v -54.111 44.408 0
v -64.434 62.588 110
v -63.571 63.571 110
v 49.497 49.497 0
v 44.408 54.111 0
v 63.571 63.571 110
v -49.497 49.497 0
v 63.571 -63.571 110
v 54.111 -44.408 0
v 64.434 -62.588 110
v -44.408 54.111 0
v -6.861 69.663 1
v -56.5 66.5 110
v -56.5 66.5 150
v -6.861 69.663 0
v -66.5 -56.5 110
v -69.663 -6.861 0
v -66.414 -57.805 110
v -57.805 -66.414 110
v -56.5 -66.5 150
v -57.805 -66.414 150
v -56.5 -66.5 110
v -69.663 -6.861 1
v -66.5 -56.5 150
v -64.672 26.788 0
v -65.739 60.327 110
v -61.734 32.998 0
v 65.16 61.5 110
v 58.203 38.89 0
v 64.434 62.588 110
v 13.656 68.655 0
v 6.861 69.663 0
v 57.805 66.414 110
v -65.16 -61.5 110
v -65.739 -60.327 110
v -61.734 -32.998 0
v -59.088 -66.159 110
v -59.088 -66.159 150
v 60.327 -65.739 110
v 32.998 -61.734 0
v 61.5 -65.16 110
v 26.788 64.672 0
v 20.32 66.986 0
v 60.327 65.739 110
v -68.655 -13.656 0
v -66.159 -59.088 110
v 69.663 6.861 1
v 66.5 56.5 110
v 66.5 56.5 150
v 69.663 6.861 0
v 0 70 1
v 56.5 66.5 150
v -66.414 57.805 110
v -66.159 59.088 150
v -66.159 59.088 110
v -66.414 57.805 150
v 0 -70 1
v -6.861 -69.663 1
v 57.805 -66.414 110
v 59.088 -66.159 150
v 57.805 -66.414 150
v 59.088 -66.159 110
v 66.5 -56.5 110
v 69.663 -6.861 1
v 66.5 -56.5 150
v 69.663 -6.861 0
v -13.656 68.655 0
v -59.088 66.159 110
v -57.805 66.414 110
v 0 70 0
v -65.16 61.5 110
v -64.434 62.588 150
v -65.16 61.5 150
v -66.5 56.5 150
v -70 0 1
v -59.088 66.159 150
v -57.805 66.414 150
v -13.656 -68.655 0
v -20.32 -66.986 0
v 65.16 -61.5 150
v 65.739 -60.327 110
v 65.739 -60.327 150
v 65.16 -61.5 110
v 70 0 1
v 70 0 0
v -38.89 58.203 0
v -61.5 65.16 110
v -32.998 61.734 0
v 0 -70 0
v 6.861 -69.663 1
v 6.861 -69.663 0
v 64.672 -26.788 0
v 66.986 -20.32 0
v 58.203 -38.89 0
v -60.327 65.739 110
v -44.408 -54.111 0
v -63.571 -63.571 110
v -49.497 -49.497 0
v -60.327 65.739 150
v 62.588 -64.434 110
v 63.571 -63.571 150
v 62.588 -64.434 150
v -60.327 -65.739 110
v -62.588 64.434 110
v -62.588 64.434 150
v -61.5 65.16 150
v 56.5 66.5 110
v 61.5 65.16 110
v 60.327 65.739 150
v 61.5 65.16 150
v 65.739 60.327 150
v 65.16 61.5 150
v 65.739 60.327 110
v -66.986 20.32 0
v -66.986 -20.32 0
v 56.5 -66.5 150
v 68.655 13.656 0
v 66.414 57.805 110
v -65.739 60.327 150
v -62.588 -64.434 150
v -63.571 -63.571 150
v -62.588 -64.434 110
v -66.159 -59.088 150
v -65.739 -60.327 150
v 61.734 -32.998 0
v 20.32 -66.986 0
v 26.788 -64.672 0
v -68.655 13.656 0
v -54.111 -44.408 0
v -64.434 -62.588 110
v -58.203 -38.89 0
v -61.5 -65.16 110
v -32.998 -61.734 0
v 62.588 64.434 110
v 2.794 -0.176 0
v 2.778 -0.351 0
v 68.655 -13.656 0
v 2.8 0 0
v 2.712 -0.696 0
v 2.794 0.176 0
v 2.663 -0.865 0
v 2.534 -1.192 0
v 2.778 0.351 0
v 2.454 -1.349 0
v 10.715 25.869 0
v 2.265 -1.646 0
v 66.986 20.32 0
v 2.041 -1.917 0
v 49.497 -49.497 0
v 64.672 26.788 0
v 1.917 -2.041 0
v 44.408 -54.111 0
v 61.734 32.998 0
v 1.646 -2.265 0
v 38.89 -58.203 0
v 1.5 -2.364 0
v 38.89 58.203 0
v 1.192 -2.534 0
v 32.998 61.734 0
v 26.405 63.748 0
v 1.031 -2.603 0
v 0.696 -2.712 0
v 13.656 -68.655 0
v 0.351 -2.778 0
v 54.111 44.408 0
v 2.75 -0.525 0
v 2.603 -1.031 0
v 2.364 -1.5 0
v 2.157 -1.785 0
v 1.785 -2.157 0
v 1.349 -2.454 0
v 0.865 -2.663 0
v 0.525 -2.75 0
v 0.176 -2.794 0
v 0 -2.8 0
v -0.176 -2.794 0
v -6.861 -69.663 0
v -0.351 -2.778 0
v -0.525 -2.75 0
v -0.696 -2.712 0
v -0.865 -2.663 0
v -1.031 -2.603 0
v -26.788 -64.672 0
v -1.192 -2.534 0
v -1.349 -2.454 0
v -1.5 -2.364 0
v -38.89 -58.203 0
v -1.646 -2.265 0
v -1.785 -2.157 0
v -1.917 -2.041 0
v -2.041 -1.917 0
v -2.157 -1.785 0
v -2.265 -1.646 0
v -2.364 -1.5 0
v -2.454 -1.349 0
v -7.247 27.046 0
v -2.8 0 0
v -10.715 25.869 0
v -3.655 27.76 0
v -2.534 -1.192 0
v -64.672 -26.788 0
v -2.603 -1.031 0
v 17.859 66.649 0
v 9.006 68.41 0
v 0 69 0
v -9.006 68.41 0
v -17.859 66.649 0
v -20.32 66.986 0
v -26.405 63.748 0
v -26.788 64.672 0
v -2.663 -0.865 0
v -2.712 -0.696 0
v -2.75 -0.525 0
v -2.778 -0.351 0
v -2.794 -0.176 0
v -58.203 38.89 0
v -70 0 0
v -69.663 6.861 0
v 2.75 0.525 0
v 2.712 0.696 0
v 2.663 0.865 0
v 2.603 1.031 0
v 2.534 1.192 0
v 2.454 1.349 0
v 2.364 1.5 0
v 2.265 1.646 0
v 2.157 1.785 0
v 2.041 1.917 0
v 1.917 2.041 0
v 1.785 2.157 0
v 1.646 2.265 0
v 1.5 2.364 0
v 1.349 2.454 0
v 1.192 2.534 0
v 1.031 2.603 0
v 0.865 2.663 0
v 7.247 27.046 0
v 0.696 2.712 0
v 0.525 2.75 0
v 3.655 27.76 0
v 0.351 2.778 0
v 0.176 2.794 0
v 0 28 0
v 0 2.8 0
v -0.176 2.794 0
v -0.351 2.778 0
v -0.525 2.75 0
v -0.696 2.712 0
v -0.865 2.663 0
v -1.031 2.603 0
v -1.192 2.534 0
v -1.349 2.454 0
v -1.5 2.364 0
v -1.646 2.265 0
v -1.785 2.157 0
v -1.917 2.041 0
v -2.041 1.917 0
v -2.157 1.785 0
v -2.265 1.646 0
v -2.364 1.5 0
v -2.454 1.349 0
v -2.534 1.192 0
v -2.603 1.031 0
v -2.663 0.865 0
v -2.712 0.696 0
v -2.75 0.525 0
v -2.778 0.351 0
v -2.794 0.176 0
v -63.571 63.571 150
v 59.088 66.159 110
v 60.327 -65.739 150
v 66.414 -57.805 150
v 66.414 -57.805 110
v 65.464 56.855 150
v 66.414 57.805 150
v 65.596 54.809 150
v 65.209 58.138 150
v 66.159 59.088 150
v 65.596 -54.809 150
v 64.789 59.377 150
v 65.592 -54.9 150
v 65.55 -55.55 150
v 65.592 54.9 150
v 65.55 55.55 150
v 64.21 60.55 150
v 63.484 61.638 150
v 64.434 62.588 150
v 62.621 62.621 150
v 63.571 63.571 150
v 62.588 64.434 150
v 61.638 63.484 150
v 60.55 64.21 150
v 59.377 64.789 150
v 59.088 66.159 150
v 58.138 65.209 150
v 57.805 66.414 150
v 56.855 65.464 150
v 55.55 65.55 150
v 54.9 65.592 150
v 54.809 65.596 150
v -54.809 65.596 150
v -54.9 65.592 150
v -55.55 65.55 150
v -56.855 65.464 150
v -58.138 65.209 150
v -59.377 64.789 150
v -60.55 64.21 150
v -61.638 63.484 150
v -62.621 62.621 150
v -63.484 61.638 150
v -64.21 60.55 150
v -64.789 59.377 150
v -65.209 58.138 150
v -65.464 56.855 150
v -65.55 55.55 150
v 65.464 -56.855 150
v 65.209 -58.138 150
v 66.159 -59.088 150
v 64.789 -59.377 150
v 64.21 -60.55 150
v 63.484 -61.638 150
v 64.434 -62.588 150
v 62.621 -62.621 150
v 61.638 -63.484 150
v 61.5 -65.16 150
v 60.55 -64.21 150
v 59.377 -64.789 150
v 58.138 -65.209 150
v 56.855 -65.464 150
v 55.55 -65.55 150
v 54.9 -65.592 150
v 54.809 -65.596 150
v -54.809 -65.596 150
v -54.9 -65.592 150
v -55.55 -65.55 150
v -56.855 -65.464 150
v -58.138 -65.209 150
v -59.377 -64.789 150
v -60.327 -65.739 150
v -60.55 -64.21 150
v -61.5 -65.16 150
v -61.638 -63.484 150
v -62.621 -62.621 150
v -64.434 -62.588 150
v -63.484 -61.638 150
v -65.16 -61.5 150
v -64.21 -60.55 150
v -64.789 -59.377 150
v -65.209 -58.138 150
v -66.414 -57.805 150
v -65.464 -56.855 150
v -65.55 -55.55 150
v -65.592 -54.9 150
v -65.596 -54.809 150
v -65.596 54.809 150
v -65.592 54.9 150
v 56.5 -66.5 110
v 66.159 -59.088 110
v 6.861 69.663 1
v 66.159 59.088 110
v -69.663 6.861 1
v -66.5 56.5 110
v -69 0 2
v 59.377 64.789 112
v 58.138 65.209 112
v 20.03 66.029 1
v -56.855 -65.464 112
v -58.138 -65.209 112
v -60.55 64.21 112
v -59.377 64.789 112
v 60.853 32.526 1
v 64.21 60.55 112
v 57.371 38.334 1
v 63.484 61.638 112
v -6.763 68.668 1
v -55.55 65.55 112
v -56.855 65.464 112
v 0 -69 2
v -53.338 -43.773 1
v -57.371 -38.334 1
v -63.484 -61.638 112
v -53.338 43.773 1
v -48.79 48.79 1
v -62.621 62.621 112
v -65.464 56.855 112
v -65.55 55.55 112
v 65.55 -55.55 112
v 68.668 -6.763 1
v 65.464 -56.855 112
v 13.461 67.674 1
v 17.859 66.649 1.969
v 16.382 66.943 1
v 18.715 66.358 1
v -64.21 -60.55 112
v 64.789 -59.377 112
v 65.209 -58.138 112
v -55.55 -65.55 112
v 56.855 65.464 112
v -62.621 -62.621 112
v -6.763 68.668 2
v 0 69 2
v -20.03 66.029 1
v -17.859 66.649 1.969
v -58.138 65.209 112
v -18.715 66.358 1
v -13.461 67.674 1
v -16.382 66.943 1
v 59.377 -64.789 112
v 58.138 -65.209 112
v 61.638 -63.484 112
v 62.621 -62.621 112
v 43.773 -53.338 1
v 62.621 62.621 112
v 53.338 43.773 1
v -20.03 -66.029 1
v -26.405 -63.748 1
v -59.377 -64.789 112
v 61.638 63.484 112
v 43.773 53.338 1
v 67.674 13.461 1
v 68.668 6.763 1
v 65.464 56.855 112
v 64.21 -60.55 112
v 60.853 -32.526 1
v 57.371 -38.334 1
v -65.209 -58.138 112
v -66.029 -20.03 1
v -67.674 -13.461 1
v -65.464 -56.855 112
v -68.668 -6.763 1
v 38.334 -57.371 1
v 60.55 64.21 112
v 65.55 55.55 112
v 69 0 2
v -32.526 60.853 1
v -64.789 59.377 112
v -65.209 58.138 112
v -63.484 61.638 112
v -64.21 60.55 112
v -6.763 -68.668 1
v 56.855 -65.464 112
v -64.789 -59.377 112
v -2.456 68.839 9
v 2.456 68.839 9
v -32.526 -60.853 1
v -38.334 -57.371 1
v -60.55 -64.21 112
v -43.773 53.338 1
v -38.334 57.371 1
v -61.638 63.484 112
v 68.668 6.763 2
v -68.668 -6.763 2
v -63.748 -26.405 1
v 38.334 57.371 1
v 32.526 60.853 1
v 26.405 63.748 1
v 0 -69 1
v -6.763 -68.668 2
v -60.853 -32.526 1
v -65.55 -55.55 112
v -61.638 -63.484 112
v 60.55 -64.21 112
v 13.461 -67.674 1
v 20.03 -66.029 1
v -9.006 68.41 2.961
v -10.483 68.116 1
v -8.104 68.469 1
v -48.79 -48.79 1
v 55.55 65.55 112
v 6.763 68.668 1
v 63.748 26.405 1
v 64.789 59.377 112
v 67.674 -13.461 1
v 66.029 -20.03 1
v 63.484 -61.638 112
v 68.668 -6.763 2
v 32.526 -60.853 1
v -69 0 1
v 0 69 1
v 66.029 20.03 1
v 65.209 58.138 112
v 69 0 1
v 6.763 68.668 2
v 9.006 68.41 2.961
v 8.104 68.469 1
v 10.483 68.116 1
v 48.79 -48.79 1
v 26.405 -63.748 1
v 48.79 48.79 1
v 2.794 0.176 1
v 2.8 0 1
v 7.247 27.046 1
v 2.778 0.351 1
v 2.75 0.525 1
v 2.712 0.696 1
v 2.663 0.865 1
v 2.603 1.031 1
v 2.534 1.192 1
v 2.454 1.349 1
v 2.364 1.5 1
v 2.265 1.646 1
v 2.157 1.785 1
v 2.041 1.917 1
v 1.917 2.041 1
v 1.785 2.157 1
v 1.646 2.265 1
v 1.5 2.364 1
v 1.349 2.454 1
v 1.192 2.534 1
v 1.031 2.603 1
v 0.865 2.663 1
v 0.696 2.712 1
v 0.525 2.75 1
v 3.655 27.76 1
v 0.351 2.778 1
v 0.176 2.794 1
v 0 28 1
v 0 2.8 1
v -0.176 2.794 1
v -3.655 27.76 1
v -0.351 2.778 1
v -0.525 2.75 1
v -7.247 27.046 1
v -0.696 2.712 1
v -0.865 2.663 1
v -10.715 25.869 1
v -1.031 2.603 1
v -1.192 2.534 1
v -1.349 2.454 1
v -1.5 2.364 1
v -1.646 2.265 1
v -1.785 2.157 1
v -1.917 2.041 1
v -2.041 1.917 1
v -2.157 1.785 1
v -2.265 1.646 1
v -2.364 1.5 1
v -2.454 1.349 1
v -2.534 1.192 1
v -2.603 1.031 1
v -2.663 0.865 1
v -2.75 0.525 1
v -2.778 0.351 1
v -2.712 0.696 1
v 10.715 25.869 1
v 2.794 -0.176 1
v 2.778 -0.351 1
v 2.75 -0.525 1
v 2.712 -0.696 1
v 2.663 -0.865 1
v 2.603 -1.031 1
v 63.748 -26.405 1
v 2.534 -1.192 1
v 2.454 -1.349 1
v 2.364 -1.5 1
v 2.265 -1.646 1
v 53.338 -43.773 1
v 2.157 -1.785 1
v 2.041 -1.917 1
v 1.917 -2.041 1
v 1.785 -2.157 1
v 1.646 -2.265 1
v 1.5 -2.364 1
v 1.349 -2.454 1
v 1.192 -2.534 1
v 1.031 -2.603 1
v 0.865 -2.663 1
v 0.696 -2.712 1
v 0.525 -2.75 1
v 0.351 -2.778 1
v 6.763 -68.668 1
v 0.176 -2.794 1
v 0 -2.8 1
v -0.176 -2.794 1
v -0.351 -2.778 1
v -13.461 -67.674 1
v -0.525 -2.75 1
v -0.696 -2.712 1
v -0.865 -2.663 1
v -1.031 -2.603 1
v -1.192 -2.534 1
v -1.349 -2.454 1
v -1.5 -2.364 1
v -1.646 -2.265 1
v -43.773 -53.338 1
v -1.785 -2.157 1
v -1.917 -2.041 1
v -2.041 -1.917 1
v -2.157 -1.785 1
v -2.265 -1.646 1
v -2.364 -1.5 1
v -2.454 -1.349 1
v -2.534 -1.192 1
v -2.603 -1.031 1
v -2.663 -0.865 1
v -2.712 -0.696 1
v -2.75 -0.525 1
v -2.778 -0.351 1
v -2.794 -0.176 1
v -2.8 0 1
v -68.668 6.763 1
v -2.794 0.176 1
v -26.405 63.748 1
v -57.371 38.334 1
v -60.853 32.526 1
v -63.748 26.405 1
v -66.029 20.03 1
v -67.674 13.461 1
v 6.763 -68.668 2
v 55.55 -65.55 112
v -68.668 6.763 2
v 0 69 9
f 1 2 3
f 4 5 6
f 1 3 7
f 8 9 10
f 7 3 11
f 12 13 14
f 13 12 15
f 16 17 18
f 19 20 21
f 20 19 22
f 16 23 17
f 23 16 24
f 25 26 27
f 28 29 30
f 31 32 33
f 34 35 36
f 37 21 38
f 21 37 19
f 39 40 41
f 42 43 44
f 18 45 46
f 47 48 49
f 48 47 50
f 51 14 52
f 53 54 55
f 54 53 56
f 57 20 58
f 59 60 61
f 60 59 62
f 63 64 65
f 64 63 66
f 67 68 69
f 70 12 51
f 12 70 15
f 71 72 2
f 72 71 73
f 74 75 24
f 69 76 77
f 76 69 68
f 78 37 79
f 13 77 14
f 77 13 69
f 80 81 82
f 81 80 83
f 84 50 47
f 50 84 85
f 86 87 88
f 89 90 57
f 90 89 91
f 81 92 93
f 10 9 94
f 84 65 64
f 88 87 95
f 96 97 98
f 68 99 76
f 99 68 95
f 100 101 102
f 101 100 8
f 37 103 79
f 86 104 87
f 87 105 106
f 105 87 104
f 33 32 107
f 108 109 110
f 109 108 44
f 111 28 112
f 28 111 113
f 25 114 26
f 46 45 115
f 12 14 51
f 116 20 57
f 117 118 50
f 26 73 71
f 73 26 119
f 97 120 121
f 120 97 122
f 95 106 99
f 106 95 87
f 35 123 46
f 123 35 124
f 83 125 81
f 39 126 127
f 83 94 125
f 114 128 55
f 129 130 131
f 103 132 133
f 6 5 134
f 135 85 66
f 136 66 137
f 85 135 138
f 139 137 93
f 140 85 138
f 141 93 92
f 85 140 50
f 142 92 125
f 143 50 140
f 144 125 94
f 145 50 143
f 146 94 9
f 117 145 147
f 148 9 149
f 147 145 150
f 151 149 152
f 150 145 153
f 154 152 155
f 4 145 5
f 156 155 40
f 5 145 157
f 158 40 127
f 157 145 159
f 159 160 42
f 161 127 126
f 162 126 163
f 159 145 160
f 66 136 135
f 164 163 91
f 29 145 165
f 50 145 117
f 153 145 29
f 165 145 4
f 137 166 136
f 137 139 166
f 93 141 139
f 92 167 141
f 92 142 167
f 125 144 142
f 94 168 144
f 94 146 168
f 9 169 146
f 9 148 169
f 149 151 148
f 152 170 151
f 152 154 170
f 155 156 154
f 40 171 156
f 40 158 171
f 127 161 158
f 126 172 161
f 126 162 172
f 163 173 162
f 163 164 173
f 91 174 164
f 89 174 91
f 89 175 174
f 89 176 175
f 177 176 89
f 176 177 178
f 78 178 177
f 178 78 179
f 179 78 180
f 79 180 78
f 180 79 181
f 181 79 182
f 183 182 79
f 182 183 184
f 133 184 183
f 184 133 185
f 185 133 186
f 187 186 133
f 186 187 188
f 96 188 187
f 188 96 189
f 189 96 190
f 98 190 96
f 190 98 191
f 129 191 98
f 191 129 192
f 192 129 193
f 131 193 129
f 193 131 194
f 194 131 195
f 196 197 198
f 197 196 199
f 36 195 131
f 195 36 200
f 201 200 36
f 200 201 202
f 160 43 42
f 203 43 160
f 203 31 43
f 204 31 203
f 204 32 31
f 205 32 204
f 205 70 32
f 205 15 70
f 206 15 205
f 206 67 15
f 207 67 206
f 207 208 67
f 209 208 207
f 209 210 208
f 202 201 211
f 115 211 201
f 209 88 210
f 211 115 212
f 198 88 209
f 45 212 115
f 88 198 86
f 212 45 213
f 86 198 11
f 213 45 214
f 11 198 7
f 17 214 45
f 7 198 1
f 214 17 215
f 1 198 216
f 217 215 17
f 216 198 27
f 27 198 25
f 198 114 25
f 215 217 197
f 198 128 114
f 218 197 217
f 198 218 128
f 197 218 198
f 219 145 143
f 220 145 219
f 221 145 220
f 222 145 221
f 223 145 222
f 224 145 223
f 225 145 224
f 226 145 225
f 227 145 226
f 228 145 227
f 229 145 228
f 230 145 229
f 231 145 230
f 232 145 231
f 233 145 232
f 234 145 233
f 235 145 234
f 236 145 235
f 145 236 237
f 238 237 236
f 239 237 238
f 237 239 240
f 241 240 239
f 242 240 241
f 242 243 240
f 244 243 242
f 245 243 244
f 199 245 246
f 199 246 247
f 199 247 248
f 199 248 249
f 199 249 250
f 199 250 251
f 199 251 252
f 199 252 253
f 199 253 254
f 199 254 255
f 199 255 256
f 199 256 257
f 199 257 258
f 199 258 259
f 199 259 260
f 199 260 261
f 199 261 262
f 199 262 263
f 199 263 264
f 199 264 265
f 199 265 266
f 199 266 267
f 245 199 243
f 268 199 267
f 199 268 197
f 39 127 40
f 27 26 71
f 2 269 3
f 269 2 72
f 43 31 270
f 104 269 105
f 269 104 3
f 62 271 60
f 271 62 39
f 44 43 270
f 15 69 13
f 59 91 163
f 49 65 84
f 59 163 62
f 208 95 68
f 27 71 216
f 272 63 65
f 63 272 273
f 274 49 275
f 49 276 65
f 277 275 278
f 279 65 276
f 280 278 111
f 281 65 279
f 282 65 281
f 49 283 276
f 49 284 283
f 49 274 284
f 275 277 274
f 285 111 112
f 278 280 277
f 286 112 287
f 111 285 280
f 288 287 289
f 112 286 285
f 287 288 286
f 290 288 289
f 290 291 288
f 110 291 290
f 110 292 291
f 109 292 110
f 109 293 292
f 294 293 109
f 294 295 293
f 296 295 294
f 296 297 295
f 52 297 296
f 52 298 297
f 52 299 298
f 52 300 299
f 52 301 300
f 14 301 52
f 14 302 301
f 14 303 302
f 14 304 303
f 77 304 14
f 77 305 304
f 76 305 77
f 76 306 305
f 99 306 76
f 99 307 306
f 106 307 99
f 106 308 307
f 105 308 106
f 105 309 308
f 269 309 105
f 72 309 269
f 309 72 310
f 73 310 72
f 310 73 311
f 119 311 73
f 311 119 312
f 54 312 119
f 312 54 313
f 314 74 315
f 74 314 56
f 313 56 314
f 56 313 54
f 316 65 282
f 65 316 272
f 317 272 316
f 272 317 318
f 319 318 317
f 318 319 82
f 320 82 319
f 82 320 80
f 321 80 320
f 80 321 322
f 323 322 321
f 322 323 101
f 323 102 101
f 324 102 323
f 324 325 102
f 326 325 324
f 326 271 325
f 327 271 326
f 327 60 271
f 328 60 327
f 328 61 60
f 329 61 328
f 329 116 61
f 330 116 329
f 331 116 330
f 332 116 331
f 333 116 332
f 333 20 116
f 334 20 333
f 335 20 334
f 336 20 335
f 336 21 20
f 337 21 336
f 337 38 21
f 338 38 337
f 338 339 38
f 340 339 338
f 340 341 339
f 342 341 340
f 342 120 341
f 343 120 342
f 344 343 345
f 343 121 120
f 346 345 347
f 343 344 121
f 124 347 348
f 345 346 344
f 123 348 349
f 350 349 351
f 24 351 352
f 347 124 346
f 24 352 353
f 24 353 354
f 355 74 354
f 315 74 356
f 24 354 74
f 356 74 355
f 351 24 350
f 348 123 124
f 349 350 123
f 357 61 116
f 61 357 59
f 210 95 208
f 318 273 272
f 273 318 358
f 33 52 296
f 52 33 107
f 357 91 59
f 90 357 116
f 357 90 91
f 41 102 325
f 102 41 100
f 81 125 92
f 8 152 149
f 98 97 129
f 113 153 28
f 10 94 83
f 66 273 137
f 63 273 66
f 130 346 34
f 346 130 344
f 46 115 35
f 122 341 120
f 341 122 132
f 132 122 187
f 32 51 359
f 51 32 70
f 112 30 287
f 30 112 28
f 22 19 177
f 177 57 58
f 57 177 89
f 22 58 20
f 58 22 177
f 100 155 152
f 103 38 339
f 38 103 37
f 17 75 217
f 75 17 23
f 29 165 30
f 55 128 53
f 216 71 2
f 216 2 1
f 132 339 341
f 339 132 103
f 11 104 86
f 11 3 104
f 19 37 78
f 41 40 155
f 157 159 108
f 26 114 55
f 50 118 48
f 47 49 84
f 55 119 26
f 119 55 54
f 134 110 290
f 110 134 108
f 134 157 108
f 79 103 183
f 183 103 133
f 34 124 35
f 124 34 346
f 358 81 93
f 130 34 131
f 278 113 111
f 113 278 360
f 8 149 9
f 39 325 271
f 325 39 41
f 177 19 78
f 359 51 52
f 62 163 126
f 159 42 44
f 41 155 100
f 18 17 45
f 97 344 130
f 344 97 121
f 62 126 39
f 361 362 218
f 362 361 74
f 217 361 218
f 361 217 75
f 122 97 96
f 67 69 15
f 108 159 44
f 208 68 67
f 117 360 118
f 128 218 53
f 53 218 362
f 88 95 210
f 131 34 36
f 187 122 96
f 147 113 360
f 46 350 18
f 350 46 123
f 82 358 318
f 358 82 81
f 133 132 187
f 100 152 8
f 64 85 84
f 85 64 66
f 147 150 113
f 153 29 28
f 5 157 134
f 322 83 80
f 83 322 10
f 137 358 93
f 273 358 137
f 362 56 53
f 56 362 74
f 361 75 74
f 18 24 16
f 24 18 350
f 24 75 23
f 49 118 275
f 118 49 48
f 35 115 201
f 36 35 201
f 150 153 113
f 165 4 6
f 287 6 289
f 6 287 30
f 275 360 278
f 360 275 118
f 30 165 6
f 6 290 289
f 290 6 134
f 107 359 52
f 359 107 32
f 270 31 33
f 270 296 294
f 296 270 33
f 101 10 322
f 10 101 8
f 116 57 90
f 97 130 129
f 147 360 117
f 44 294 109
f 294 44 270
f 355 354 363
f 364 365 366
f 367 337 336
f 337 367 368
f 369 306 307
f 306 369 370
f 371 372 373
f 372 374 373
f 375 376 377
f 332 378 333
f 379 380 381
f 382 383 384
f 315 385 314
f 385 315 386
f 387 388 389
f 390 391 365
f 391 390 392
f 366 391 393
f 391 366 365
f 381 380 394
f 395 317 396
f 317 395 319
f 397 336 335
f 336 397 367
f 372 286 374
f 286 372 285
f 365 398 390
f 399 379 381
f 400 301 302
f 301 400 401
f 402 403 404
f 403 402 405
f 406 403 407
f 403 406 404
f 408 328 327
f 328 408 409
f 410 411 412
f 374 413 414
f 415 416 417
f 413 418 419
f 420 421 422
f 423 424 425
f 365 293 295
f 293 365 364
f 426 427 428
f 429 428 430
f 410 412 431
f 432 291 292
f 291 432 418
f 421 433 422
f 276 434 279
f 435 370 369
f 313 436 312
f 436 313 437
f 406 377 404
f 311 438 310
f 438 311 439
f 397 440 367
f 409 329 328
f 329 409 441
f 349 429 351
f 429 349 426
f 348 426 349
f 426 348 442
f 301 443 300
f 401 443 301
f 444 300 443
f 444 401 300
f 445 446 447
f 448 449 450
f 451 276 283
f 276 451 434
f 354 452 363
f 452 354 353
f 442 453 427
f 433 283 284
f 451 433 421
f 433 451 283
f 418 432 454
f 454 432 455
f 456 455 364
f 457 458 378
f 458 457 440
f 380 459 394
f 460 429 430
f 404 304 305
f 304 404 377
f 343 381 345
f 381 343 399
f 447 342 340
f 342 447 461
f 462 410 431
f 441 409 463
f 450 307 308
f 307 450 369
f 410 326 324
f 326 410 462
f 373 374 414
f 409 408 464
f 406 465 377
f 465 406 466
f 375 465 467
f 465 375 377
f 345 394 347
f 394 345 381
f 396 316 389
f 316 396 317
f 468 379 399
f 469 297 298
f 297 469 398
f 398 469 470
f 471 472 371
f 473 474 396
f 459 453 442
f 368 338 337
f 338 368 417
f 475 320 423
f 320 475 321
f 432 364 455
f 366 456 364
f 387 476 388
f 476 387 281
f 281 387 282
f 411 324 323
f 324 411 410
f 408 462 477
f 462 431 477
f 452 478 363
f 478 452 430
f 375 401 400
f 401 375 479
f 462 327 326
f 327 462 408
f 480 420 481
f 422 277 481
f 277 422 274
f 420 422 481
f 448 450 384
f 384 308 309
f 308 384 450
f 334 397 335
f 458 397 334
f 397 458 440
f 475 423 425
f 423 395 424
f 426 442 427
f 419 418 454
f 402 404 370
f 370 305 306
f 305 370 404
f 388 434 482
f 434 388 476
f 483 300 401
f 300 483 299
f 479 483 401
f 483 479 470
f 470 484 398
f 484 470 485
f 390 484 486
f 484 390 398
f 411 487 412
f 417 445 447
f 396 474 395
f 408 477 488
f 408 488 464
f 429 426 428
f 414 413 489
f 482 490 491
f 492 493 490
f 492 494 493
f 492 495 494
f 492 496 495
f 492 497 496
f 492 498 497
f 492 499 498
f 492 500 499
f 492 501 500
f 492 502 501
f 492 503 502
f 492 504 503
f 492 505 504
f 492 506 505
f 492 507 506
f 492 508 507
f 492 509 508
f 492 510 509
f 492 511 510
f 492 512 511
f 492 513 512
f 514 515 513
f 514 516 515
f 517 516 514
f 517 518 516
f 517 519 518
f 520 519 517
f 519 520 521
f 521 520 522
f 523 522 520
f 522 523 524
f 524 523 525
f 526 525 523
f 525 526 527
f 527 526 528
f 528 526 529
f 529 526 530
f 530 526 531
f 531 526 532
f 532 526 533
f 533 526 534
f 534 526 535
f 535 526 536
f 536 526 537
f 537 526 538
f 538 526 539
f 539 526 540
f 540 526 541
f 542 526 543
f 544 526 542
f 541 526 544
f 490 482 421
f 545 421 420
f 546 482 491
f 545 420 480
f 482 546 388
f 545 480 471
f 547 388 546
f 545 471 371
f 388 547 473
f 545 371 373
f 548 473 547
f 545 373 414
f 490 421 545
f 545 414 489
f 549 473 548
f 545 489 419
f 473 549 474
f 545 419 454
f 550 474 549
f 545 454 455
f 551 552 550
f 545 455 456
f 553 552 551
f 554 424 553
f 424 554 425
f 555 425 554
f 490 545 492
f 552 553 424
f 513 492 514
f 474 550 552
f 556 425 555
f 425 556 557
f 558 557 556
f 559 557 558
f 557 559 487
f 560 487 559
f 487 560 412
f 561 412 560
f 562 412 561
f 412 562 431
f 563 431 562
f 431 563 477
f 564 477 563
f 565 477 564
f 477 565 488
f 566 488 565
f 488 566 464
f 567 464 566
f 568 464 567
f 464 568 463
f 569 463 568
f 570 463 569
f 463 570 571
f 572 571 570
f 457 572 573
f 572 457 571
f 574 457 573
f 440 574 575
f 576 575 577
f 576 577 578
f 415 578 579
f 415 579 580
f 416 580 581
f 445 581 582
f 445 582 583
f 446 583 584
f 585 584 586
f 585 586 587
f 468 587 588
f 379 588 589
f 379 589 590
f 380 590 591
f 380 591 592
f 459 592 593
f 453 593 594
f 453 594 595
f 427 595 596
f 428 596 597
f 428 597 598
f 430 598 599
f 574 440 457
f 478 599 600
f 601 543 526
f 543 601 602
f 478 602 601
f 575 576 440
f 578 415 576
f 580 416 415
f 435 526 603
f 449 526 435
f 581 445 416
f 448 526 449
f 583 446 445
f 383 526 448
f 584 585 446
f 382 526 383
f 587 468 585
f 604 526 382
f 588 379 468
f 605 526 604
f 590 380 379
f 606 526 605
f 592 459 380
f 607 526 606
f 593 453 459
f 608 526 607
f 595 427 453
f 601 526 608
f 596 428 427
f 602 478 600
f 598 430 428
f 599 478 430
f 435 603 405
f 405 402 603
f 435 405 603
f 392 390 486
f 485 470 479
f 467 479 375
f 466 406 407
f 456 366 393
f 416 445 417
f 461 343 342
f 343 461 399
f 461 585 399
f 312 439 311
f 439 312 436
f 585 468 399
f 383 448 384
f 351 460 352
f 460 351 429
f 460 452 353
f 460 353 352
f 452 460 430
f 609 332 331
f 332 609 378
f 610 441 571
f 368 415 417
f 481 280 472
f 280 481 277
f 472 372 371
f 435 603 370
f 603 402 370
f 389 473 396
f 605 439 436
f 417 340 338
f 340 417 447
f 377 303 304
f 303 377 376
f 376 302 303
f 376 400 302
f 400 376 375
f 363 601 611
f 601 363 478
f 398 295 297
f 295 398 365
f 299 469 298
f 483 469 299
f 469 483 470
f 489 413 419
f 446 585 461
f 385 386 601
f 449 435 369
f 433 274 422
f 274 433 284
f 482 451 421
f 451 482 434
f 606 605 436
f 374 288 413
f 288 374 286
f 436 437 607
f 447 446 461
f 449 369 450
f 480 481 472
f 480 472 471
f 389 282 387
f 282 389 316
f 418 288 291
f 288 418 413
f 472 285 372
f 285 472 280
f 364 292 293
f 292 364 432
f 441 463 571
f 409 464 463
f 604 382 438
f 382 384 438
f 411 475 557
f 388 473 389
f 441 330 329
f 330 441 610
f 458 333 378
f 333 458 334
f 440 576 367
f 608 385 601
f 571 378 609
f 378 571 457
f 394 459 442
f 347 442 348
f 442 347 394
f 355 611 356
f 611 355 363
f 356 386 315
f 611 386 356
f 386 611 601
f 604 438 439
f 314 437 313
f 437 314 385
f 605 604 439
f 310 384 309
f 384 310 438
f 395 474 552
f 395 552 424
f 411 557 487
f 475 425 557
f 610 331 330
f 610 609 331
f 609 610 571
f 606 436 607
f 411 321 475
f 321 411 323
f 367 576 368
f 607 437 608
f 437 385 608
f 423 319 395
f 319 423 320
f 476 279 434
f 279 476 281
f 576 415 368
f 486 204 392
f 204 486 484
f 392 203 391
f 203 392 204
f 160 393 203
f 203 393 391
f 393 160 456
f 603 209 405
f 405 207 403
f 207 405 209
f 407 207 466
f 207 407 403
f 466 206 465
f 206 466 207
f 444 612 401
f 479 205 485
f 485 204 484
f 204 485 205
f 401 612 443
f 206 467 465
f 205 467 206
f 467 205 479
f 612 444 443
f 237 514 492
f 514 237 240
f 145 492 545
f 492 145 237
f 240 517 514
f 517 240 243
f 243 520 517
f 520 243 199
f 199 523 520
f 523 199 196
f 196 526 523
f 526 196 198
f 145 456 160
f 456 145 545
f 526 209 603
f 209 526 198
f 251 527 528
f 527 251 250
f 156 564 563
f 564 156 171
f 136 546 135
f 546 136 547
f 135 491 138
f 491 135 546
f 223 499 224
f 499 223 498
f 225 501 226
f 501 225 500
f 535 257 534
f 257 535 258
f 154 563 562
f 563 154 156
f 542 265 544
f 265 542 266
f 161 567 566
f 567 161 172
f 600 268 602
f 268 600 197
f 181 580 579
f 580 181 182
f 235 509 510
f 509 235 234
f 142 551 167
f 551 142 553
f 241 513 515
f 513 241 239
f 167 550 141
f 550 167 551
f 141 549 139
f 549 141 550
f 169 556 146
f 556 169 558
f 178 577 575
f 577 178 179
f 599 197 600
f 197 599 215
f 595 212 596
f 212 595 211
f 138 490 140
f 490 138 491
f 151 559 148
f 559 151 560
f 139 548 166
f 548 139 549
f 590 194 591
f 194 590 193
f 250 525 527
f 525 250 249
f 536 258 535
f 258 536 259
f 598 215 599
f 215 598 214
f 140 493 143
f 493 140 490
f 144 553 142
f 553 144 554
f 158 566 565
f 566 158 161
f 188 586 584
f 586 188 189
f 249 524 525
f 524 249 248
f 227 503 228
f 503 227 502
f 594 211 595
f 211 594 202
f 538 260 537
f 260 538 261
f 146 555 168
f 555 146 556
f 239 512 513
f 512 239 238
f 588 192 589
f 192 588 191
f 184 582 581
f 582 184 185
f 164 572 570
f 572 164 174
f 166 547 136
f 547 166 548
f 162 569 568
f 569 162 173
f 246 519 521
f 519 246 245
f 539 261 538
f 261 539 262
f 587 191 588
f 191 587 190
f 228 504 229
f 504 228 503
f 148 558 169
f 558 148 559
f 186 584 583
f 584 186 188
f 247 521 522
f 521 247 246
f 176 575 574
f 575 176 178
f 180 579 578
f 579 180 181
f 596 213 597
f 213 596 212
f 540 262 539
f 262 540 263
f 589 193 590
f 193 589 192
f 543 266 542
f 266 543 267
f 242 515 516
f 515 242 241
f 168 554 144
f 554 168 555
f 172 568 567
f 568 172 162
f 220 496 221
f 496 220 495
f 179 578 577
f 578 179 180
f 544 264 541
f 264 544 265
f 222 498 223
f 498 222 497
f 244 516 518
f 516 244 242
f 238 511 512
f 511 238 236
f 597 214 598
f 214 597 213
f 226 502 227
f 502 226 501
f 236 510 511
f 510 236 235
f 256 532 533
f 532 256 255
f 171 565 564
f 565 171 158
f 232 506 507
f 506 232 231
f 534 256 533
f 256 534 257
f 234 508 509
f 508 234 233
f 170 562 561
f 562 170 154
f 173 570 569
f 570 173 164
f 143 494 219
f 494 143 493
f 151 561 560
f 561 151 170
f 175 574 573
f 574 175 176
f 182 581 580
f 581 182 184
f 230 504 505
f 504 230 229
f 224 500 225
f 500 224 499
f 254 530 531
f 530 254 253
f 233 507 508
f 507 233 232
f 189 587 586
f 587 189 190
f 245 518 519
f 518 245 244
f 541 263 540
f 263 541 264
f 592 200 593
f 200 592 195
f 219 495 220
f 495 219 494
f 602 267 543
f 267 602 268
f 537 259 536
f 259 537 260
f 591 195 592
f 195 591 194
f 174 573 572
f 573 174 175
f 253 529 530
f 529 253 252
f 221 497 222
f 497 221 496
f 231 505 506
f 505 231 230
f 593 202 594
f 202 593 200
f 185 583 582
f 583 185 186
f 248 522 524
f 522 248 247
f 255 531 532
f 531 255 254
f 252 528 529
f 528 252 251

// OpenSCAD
// file: carousel_hole.scad
include <params.scad>


// for tests
//cut([0,1,0])
hole_shape(reservoirR, 10, 35);


module hole_shape(radius, inner_radius, angle, thickness=10) {
    rotate([0, 0, -angle/2])
    difference() {
        cylinder(thickness, r=radius, center=false, $fn=48);
        
        translate([0, 0, -1])
        cylinder(thickness*2, r=inner_radius, center=false, $fn=48);
        
        // remove bottom half
        translate([-radius*2, -radius*2, -1])
        cube([radius*4, radius*2, thickness*2]);
        
        // remove left half
        translate([-radius*2, -radius*2, -1])
        cube([radius*2, radius*4, thickness*2]);

        // remove the rest
        rotate([0, 0, angle])
        translate([0, 0, -1])
        cube([radius*2, radius*2, thickness*2]);
    }
}
// file: ../utils/motor.scad
// for local tests only
//motor();

// measured dimensions
motor_total_length=71.35;
motor_block_length=47.3;
motor_block_side=42.3;
motor_block_flat_diameter=53.6;
motor_block_and_disk_length=49;
motor_disk_diameter=22;
motor_disk_length=motor_block_and_disk_length - motor_block_length;
motor_axis_length=motor_total_length - motor_block_and_disk_length;
motor_axis_diameter=5;
motor_axis_diameter_flat=4.5;
motor_axis_radius=motor_axis_diameter / 2;
motor_axis_radius_flat=motor_axis_diameter_flat - motor_axis_radius;

module motor(axis_angle=90) {
    rotate([0,axis_angle,0])
    motor_axis();
    motor_block();
}

module motor_axis(radiusPadding=0, with_flat_section=true) {
    difference() {
        rotate([90,0,0])
        cylinder(motor_axis_length,r=motor_axis_radius+radiusPadding,center=false,$fn=100);
        
        if (with_flat_section) {
            translate([-5,-motor_axis_length-1,motor_axis_radius_flat])
            cube([10,motor_axis_length+2,10],center=false);
        }
    }
}

module motor_block() {
    rotate([90,0,0])
    translate([0,0,-motor_disk_length])
    cylinder(motor_disk_length,r=motor_disk_diameter/2,center=false,$fn=30);
        
    difference() {
        rotate([90,0,0])
        translate([-motor_block_side/2,-motor_block_side/2,-motor_block_length-motor_disk_length])
        cube([motor_block_side,motor_block_side,motor_block_length],center=false);
        
        for(i=[0:1:3]) {
            rotate([0,45+90*i,0])
            translate([0,0,motor_block_flat_diameter/2])
            motor_block_edge_cutter();
        }
    }
}

module motor_block_edge_cutter() {
    rotate([90,0,0])
    translate([-motor_block_side/2,0,-motor_block_length-motor_disk_length-1])
    cube([motor_block_side,10,motor_block_length+2],center=false);
}
// file: ../utils/utils.scad
module trapezoid(len1, len2, h, thickness, top_offset_x = 0) {
    linear_extrude(height=thickness, center=true, scale = 1.0, $fn = 16) {
        polygon(points = [
            [-len1/2, -h/2],
            [len1/2, -h/2],
            [len2/2 + top_offset_x, h/2],
            [-len2/2 + top_offset_x, h/2],
        ]);
    }
}



module cut(vec=[1,0,0]){
    cube_size = 300;
    difference(){
        for(i=[0:$children-1]) {children();}
        
        base_offset = [sign(vec[0])*cube_size/2,sign(vec[1])*cube_size/2,sign(vec[2])*cube_size/2];
        
        color("#ff0000")
        translate(base_offset + vec)
        cube(cube_size,true);
    }
}

module rect_rounded(width, height, thickness, rounding_radius) {
    w = width/2 - rounding_radius;
    h = height/2 - rounding_radius;
    hull() {
        translate([-w, -h, 0])
        cylinder(thickness, r=rounding_radius, center=false, $fn=48);
        
        translate([w, -h, 0])
        cylinder(thickness, r=rounding_radius, center=false, $fn=48);
        
        translate([-w, h, 0])
        cylinder(thickness, r=rounding_radius, center=false, $fn=48);
        
        translate([w, h, 0])
        cylinder(thickness, r=rounding_radius, center=false, $fn=48);
    }
}
// file: params.scad
include <../utils/motor.scad>

thickness=1;
clearance=0.3;

reservoirR=70;
reservoirH=150;

carouselH=10;
carouselHoleAngle=25;

bottomH = motor_block_and_disk_length + thickness + clearance * 2;
// main file
include <params.scad>
include <../utils/utils.scad>

use <../utils/motor.scad>
use <carousel_hole.scad>

// for tests
//cut([0,1,0])
reservoir();

holeInnerRadius = reservoirR*0.4;
spacerR = reservoirR*0.3;

module reservoir() {
    difference() {
        // main shell
        body(reservoirR, reservoirH);
        
        // hole for the motor axis
        translate([0, 0, 10])
        rotate([90, 0, 0])
        motor_axis(clearance, false);

        // carve a hole in the bottom for kibble
        rotate([0, 0, 90])
        translate([0, 0, -thickness])
        hole_shape(reservoirR - thickness, holeInnerRadius, 45);
    }
}


module body(radius, height) {
    difference() {
        body_shape(radius, height);
        
        translate([0, 0, thickness])
        body_shape(radius - thickness, height+1);
    }
}

module body_shape(radius, height) {
    w = radius * 1.9;
    topH = 40;

    hull() {
        translate([0, 0, height - topH])
        rect_rounded(w, w, topH, 10);

        translate([0, 0, 0])
        rotate([0, 0, 0])
        cylinder(1, r=radius, center=false, $fn=64);
    }
}
